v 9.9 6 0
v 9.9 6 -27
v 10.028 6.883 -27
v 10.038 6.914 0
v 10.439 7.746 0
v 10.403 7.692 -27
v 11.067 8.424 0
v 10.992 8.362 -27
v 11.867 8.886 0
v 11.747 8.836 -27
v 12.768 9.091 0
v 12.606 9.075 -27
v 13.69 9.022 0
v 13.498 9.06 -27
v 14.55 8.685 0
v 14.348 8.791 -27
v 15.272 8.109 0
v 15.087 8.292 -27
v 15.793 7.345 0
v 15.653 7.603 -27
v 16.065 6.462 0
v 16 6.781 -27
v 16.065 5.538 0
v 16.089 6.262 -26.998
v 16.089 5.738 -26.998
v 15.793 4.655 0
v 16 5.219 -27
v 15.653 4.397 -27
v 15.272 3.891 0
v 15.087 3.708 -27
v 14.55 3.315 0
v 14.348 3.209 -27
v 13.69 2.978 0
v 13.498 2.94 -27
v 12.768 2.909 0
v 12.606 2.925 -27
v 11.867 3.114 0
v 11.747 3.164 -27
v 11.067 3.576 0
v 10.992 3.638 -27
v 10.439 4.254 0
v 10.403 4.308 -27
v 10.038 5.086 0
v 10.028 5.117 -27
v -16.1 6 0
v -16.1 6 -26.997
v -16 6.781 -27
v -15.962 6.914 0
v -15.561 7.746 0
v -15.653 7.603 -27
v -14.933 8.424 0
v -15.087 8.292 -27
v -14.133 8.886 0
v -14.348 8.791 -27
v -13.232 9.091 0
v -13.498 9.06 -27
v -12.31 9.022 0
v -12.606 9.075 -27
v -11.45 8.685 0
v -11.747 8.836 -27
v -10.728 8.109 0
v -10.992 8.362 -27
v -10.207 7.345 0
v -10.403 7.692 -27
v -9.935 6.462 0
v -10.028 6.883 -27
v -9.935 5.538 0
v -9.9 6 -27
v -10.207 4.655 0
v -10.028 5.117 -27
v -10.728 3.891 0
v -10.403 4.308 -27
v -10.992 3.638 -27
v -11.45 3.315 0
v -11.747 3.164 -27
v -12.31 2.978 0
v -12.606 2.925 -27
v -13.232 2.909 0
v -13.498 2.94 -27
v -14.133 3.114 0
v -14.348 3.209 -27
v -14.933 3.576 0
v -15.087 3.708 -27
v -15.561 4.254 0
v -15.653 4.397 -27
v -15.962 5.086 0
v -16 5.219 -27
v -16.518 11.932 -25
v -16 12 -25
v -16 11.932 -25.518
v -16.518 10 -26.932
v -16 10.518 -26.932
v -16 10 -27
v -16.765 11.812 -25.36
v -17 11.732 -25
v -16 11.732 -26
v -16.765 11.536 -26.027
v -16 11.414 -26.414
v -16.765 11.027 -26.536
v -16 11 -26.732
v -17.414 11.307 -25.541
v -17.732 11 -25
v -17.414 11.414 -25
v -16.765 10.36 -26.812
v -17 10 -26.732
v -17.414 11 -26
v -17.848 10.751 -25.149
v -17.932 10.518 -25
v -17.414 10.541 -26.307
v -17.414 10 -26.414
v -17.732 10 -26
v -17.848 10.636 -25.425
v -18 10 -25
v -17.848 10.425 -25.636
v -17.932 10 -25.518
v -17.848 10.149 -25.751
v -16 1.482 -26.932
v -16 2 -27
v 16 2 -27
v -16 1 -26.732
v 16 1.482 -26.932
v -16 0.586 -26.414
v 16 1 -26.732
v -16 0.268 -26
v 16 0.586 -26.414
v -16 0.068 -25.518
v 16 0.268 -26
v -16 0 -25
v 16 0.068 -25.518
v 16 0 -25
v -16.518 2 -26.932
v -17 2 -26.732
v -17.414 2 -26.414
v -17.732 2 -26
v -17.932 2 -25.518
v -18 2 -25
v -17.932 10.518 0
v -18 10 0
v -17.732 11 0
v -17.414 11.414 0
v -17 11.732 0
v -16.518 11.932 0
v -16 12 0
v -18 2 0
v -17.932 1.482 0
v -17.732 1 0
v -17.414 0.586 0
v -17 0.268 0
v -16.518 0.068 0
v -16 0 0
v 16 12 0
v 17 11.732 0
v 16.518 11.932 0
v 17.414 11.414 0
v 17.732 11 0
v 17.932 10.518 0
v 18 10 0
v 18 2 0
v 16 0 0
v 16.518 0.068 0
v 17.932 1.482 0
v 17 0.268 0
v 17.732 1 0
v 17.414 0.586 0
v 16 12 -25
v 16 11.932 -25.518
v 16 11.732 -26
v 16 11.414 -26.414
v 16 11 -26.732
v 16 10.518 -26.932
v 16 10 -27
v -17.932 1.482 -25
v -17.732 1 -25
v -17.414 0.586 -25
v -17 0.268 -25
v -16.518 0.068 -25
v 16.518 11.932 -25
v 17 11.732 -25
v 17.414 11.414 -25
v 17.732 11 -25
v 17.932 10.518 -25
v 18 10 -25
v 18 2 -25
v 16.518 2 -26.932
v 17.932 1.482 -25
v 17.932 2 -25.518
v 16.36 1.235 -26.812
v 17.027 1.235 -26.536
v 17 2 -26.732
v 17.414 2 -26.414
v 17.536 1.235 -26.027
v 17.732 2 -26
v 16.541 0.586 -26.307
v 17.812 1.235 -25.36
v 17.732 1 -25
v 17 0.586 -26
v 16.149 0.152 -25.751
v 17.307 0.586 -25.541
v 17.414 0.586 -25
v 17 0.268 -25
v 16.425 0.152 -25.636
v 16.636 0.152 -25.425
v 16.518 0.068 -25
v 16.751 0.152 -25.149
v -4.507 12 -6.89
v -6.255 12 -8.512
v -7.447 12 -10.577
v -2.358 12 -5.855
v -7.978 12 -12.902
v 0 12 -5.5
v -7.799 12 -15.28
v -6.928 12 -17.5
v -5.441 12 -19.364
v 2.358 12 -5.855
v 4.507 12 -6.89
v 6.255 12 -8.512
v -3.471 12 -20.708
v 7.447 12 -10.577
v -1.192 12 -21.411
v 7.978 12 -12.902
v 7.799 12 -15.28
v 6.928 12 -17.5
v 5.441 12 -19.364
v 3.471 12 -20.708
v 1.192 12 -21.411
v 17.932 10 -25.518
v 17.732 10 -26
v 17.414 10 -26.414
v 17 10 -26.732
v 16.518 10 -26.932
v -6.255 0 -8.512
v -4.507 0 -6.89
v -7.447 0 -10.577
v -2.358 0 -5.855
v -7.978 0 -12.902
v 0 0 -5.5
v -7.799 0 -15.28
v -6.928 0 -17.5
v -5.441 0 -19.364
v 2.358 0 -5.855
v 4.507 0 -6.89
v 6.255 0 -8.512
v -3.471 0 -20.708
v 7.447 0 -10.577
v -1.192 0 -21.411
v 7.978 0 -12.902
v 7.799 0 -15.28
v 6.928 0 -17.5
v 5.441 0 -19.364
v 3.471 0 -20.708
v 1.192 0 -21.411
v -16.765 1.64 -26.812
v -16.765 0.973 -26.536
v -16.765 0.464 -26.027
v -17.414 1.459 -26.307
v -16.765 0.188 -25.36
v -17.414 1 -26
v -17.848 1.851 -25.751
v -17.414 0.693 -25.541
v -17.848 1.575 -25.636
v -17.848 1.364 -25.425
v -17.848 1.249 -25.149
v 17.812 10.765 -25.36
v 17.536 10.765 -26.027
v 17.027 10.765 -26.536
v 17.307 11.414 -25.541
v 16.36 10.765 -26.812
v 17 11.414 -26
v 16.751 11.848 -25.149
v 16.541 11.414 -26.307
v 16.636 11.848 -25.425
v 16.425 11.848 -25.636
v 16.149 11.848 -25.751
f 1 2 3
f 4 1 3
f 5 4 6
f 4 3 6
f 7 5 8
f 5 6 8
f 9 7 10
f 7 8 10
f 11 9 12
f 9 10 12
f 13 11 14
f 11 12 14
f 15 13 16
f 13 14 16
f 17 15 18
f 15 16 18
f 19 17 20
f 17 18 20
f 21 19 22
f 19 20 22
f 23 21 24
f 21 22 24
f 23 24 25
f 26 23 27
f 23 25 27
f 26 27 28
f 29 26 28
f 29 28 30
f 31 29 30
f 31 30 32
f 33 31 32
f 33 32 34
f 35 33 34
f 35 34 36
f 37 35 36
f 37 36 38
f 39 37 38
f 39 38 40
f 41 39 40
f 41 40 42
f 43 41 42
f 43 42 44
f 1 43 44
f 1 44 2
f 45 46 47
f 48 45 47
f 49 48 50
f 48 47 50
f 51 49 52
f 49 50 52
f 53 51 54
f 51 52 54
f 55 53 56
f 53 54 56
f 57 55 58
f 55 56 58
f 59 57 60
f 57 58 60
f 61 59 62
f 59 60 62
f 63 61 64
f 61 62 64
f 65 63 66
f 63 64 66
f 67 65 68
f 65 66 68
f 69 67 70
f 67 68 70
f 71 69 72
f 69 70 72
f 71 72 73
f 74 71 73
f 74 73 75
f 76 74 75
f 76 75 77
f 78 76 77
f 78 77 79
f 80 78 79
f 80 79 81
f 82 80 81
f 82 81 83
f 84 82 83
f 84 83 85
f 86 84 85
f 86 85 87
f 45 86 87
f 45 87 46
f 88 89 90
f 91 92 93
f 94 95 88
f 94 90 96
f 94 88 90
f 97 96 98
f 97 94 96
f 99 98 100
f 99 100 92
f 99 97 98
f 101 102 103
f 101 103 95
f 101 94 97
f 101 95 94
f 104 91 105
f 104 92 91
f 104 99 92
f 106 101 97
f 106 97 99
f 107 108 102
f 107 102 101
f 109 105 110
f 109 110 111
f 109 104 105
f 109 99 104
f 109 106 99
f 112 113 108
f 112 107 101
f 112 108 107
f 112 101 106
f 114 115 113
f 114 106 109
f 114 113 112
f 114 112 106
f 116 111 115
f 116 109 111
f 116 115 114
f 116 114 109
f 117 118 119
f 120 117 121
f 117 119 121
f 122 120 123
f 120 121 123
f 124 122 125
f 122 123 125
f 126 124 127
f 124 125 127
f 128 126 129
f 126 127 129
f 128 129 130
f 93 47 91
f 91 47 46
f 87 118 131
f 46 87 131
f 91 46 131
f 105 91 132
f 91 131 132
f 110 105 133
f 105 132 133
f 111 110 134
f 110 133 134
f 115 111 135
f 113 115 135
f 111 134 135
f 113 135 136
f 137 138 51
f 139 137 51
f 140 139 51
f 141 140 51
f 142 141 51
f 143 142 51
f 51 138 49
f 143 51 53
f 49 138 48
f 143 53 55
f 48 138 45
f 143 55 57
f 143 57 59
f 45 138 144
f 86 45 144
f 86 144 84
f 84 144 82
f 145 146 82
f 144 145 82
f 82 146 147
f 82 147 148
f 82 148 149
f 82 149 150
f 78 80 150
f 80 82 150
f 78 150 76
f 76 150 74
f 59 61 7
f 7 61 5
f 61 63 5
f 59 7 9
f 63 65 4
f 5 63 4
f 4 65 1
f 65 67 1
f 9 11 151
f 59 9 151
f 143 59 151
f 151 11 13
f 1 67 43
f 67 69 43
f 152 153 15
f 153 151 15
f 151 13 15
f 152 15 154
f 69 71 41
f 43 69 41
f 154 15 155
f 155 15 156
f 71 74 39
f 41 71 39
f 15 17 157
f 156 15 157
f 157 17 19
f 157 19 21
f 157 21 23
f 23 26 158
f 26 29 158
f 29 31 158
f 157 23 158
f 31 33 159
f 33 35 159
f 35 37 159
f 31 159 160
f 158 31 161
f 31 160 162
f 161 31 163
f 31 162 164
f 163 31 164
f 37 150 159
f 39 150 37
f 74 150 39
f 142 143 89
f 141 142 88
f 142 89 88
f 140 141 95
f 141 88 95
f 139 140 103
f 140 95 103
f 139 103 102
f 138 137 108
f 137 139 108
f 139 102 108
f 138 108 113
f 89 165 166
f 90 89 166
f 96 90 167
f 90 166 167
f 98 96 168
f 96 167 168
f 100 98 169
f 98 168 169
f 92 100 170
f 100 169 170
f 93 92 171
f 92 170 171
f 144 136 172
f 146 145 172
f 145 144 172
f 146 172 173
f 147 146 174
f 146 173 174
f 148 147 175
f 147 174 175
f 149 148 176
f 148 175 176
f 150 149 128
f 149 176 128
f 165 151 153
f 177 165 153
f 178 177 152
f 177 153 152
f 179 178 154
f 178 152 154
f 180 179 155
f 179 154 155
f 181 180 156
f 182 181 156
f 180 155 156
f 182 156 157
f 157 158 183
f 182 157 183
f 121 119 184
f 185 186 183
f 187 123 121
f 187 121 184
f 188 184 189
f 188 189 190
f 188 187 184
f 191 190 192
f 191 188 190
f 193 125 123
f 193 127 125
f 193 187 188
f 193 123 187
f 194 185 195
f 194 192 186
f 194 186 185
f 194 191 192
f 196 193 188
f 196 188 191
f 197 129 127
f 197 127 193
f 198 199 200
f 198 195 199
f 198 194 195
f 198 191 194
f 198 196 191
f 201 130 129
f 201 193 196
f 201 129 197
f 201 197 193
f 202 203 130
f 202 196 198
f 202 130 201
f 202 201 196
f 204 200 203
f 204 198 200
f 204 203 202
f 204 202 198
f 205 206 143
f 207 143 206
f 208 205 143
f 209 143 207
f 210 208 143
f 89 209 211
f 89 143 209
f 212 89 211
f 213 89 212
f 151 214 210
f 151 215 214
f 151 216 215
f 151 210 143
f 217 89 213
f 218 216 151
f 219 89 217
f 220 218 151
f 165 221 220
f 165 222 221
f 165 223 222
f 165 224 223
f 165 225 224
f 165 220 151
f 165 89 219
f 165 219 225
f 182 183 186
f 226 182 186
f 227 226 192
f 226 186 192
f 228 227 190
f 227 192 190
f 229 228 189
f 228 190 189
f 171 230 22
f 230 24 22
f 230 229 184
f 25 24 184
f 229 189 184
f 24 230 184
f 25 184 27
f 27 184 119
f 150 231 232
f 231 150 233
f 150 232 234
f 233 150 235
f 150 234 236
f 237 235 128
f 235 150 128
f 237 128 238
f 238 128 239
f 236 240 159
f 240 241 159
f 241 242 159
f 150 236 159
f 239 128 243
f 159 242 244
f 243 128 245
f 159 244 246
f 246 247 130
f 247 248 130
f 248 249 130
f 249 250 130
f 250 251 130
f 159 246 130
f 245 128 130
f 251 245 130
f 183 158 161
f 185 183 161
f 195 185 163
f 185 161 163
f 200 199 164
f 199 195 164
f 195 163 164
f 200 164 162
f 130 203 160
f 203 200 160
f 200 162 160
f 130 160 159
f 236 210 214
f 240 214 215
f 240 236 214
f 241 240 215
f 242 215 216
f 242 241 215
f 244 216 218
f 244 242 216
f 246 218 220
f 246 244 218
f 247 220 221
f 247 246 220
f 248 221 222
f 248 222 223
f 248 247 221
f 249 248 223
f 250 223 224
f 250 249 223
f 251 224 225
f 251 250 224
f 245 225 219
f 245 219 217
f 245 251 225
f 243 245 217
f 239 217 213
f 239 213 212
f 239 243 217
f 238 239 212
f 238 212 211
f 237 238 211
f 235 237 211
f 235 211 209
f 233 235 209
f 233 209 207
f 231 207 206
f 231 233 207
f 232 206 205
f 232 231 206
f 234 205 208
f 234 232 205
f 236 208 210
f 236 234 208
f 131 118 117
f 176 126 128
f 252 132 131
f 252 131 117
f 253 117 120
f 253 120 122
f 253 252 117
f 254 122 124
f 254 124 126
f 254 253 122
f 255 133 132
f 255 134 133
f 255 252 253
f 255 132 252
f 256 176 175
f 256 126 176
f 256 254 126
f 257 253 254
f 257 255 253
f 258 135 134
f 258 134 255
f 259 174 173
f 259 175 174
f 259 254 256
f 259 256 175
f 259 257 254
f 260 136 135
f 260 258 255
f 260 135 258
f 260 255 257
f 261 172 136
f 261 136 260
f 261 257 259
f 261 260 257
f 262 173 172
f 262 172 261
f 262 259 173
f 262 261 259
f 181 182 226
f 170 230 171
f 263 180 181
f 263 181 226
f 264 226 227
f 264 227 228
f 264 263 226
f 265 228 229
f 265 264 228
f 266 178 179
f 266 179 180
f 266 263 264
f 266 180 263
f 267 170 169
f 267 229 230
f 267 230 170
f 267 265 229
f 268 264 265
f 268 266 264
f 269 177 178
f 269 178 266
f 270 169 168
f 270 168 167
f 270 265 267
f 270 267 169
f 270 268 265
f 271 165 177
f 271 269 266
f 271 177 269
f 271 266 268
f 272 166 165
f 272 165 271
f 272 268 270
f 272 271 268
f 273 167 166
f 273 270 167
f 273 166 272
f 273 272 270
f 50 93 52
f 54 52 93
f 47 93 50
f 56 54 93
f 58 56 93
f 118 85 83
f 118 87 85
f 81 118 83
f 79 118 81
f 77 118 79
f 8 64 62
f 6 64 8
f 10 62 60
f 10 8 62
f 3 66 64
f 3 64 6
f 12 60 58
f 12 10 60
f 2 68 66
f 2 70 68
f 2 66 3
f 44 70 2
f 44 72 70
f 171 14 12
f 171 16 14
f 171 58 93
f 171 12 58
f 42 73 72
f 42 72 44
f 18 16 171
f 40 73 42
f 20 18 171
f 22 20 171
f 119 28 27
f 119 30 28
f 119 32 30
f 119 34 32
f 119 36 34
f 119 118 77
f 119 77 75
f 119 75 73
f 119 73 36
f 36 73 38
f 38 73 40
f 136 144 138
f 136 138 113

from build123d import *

# Parameters (mm, degrees)
SKETCH1_W           = 36
SKETCH1_H           = 27
SKETCH1_R           = 8
BOSS_EXTRUDE1_DEPTH = 12
SKETCH3_R           = 3.1
CUT_EXTRUDE1_DEPTH  = 35.597687784
FILLET1_R           = 2


with BuildPart() as part:
    # Sketch1 → Boss-Extrude1 (new body)
    with BuildSketch(Plane(origin=(0, 0, 0), x_dir=(1, 0, 0), z_dir=(0, 1, 0))):
        with Locations((0, 13.5)):
            Rectangle(SKETCH1_W, SKETCH1_H)
        with Locations(Location((0, 13.5, 0), (0, 0, 270))):
            Circle(SKETCH1_R, mode=Mode.SUBTRACT)
    extrude(amount=BOSS_EXTRUDE1_DEPTH)

    # Sketch3 → Cut-Extrude1 (cut, through all)
    with BuildSketch(Plane(origin=(0, 0, -27), x_dir=(-1, 0, 0), z_dir=(0, 0, -1))):
        with Locations((13, 6)):
            Circle(SKETCH3_R)
        with Locations((-13, 6)):
            Circle(SKETCH3_R)
    extrude(amount=-CUT_EXTRUDE1_DEPTH, mode=Mode.SUBTRACT)

    # Fillet1
    # the kernel refuses this fillet: 2 mm, written as the material it takes off along each edge
    with BuildSketch(Plane(origin=(16, 10, -25), x_dir=(1, 0, 0), z_dir=(0, 1, 0))) as fillet1_piece_1_section:
        Polygon((0, 0), (FILLET1_R, 0), (FILLET1_R, FILLET1_R), (0, FILLET1_R), align=None)
    fillet1_piece_1 = extrude(amount=FILLET1_R, mode=Mode.PRIVATE)
    fillet1_piece_1 = fillet1_piece_1 - Plane(origin=(16, 10, -25), x_dir=(-0.7071067811865476, 0, 0.7071067811865475), z_dir=(0, 1, 0)) * Sphere(FILLET1_R, mode=Mode.PRIVATE)
    add(fillet1_piece_1, mode=Mode.SUBTRACT)
    with BuildSketch(Plane(origin=(-16, 10, -25), x_dir=(0, 1, 0), z_dir=(-1, 0, 0))) as fillet1_piece_2_section:
        Polygon((0, 0), (FILLET1_R, 0), (FILLET1_R, FILLET1_R), (0, FILLET1_R), align=None)
    fillet1_piece_2 = extrude(amount=FILLET1_R, mode=Mode.PRIVATE)
    fillet1_piece_2 = fillet1_piece_2 - Plane(origin=(-16, 10, -25), x_dir=(0, -0.7071067811865475, 0.7071067811865475), z_dir=(-1, 0, 0)) * Sphere(FILLET1_R, mode=Mode.PRIVATE)
    add(fillet1_piece_2, mode=Mode.SUBTRACT)
    with BuildSketch(Plane(origin=(16, 2, -25), x_dir=(1, 0, 0), z_dir=(0, -1, 0))) as fillet1_piece_3_section:
        Polygon((0, 0), (FILLET1_R, 0), (FILLET1_R, -FILLET1_R), (0, -FILLET1_R), align=None)
    fillet1_piece_3 = extrude(amount=FILLET1_R, mode=Mode.PRIVATE)
    fillet1_piece_3 = fillet1_piece_3 - Plane(origin=(16, 2, -25), x_dir=(-0.7071067811865476, 0, 0.7071067811865475), z_dir=(0, -1, 0)) * Sphere(FILLET1_R, mode=Mode.PRIVATE)
    add(fillet1_piece_3, mode=Mode.SUBTRACT)
    with BuildSketch(Plane(origin=(-16, 2, -25), x_dir=(0, -1, 0), z_dir=(-1, 0, 0))) as fillet1_piece_4_section:
        Polygon((0, 0), (FILLET1_R, 0), (FILLET1_R, -FILLET1_R), (0, -FILLET1_R), align=None)
    fillet1_piece_4 = extrude(amount=FILLET1_R, mode=Mode.PRIVATE)
    fillet1_piece_4 = fillet1_piece_4 - Plane(origin=(-16, 2, -25), x_dir=(0, 0.7071067811865475, 0.7071067811865475), z_dir=(-1, 0, 0)) * Sphere(FILLET1_R, mode=Mode.PRIVATE)
    add(fillet1_piece_4, mode=Mode.SUBTRACT)
    with BuildSketch(Plane(origin=(18, 12, 5), x_dir=(-1, 0, 0), z_dir=(0, 0, -1)), Plane(origin=(-18, 0, -25), x_dir=(0, 1, 0), z_dir=(0, 0, 1))) as fillet1_piece_5:
        with BuildLine():
            CenterArc((FILLET1_R, -FILLET1_R), FILLET1_R, 90, 90)
            Line((0, -FILLET1_R), (0, 0))
            Line((0, 0), (FILLET1_R, 0))
        make_face()
    extrude(amount=30, mode=Mode.SUBTRACT)
    with BuildSketch(Plane(origin=(16, 12, -27), x_dir=(0, 0, 1), z_dir=(-1, 0, 0))) as fillet1_piece_6:
        with BuildLine():
            CenterArc((FILLET1_R, -FILLET1_R), FILLET1_R, 90, 90)
            Line((0, -FILLET1_R), (0, 0))
            Line((0, 0), (FILLET1_R, 0))
        make_face()
    extrude(amount=32, mode=Mode.SUBTRACT)
    with BuildSketch(Plane(origin=(-18, 12, -25), x_dir=(0, -1, 0), z_dir=(0, 0, 1)), Plane(origin=(18, 0, 5), x_dir=(-1, 0, 0), z_dir=(0, 0, -1))) as fillet1_piece_7:
        with BuildLine():
            CenterArc((FILLET1_R, FILLET1_R), FILLET1_R, 180, 90)
            Line((0, FILLET1_R), (0, 0))
            Line((0, 0), (FILLET1_R, 0))
        make_face()
    extrude(amount=30, mode=Mode.SUBTRACT)
    with BuildSketch(Plane(origin=(16, 0, -27), x_dir=(0, 0, 1), z_dir=(-1, 0, 0))) as fillet1_piece_8:
        with BuildLine():
            CenterArc((FILLET1_R, FILLET1_R), FILLET1_R, 180, 90)
            Line((0, FILLET1_R), (0, 0))
            Line((0, 0), (FILLET1_R, 0))
        make_face()
    extrude(amount=32, mode=Mode.SUBTRACT)
    with BuildSketch(Plane(origin=(-18, 2, -27), x_dir=(0, 0, 1), z_dir=(0, 1, 0))) as fillet1_piece_9:
        with BuildLine():
            CenterArc((FILLET1_R, FILLET1_R), FILLET1_R, 180, 90)
            Line((0, FILLET1_R), (0, 0))
            Line((0, 0), (FILLET1_R, 0))
        make_face()
    extrude(amount=8, mode=Mode.SUBTRACT)
    with BuildSketch(Plane(origin=(18, 2, -27), x_dir=(0, 0, 1), z_dir=(0, 1, 0))) as fillet1_piece_10:
        with BuildLine():
            CenterArc((FILLET1_R, -FILLET1_R), FILLET1_R, 90, 90)
            Line((0, -FILLET1_R), (0, 0))
            Line((0, 0), (FILLET1_R, 0))
        make_face()
    extrude(amount=8, mode=Mode.SUBTRACT)


solid = part.part
